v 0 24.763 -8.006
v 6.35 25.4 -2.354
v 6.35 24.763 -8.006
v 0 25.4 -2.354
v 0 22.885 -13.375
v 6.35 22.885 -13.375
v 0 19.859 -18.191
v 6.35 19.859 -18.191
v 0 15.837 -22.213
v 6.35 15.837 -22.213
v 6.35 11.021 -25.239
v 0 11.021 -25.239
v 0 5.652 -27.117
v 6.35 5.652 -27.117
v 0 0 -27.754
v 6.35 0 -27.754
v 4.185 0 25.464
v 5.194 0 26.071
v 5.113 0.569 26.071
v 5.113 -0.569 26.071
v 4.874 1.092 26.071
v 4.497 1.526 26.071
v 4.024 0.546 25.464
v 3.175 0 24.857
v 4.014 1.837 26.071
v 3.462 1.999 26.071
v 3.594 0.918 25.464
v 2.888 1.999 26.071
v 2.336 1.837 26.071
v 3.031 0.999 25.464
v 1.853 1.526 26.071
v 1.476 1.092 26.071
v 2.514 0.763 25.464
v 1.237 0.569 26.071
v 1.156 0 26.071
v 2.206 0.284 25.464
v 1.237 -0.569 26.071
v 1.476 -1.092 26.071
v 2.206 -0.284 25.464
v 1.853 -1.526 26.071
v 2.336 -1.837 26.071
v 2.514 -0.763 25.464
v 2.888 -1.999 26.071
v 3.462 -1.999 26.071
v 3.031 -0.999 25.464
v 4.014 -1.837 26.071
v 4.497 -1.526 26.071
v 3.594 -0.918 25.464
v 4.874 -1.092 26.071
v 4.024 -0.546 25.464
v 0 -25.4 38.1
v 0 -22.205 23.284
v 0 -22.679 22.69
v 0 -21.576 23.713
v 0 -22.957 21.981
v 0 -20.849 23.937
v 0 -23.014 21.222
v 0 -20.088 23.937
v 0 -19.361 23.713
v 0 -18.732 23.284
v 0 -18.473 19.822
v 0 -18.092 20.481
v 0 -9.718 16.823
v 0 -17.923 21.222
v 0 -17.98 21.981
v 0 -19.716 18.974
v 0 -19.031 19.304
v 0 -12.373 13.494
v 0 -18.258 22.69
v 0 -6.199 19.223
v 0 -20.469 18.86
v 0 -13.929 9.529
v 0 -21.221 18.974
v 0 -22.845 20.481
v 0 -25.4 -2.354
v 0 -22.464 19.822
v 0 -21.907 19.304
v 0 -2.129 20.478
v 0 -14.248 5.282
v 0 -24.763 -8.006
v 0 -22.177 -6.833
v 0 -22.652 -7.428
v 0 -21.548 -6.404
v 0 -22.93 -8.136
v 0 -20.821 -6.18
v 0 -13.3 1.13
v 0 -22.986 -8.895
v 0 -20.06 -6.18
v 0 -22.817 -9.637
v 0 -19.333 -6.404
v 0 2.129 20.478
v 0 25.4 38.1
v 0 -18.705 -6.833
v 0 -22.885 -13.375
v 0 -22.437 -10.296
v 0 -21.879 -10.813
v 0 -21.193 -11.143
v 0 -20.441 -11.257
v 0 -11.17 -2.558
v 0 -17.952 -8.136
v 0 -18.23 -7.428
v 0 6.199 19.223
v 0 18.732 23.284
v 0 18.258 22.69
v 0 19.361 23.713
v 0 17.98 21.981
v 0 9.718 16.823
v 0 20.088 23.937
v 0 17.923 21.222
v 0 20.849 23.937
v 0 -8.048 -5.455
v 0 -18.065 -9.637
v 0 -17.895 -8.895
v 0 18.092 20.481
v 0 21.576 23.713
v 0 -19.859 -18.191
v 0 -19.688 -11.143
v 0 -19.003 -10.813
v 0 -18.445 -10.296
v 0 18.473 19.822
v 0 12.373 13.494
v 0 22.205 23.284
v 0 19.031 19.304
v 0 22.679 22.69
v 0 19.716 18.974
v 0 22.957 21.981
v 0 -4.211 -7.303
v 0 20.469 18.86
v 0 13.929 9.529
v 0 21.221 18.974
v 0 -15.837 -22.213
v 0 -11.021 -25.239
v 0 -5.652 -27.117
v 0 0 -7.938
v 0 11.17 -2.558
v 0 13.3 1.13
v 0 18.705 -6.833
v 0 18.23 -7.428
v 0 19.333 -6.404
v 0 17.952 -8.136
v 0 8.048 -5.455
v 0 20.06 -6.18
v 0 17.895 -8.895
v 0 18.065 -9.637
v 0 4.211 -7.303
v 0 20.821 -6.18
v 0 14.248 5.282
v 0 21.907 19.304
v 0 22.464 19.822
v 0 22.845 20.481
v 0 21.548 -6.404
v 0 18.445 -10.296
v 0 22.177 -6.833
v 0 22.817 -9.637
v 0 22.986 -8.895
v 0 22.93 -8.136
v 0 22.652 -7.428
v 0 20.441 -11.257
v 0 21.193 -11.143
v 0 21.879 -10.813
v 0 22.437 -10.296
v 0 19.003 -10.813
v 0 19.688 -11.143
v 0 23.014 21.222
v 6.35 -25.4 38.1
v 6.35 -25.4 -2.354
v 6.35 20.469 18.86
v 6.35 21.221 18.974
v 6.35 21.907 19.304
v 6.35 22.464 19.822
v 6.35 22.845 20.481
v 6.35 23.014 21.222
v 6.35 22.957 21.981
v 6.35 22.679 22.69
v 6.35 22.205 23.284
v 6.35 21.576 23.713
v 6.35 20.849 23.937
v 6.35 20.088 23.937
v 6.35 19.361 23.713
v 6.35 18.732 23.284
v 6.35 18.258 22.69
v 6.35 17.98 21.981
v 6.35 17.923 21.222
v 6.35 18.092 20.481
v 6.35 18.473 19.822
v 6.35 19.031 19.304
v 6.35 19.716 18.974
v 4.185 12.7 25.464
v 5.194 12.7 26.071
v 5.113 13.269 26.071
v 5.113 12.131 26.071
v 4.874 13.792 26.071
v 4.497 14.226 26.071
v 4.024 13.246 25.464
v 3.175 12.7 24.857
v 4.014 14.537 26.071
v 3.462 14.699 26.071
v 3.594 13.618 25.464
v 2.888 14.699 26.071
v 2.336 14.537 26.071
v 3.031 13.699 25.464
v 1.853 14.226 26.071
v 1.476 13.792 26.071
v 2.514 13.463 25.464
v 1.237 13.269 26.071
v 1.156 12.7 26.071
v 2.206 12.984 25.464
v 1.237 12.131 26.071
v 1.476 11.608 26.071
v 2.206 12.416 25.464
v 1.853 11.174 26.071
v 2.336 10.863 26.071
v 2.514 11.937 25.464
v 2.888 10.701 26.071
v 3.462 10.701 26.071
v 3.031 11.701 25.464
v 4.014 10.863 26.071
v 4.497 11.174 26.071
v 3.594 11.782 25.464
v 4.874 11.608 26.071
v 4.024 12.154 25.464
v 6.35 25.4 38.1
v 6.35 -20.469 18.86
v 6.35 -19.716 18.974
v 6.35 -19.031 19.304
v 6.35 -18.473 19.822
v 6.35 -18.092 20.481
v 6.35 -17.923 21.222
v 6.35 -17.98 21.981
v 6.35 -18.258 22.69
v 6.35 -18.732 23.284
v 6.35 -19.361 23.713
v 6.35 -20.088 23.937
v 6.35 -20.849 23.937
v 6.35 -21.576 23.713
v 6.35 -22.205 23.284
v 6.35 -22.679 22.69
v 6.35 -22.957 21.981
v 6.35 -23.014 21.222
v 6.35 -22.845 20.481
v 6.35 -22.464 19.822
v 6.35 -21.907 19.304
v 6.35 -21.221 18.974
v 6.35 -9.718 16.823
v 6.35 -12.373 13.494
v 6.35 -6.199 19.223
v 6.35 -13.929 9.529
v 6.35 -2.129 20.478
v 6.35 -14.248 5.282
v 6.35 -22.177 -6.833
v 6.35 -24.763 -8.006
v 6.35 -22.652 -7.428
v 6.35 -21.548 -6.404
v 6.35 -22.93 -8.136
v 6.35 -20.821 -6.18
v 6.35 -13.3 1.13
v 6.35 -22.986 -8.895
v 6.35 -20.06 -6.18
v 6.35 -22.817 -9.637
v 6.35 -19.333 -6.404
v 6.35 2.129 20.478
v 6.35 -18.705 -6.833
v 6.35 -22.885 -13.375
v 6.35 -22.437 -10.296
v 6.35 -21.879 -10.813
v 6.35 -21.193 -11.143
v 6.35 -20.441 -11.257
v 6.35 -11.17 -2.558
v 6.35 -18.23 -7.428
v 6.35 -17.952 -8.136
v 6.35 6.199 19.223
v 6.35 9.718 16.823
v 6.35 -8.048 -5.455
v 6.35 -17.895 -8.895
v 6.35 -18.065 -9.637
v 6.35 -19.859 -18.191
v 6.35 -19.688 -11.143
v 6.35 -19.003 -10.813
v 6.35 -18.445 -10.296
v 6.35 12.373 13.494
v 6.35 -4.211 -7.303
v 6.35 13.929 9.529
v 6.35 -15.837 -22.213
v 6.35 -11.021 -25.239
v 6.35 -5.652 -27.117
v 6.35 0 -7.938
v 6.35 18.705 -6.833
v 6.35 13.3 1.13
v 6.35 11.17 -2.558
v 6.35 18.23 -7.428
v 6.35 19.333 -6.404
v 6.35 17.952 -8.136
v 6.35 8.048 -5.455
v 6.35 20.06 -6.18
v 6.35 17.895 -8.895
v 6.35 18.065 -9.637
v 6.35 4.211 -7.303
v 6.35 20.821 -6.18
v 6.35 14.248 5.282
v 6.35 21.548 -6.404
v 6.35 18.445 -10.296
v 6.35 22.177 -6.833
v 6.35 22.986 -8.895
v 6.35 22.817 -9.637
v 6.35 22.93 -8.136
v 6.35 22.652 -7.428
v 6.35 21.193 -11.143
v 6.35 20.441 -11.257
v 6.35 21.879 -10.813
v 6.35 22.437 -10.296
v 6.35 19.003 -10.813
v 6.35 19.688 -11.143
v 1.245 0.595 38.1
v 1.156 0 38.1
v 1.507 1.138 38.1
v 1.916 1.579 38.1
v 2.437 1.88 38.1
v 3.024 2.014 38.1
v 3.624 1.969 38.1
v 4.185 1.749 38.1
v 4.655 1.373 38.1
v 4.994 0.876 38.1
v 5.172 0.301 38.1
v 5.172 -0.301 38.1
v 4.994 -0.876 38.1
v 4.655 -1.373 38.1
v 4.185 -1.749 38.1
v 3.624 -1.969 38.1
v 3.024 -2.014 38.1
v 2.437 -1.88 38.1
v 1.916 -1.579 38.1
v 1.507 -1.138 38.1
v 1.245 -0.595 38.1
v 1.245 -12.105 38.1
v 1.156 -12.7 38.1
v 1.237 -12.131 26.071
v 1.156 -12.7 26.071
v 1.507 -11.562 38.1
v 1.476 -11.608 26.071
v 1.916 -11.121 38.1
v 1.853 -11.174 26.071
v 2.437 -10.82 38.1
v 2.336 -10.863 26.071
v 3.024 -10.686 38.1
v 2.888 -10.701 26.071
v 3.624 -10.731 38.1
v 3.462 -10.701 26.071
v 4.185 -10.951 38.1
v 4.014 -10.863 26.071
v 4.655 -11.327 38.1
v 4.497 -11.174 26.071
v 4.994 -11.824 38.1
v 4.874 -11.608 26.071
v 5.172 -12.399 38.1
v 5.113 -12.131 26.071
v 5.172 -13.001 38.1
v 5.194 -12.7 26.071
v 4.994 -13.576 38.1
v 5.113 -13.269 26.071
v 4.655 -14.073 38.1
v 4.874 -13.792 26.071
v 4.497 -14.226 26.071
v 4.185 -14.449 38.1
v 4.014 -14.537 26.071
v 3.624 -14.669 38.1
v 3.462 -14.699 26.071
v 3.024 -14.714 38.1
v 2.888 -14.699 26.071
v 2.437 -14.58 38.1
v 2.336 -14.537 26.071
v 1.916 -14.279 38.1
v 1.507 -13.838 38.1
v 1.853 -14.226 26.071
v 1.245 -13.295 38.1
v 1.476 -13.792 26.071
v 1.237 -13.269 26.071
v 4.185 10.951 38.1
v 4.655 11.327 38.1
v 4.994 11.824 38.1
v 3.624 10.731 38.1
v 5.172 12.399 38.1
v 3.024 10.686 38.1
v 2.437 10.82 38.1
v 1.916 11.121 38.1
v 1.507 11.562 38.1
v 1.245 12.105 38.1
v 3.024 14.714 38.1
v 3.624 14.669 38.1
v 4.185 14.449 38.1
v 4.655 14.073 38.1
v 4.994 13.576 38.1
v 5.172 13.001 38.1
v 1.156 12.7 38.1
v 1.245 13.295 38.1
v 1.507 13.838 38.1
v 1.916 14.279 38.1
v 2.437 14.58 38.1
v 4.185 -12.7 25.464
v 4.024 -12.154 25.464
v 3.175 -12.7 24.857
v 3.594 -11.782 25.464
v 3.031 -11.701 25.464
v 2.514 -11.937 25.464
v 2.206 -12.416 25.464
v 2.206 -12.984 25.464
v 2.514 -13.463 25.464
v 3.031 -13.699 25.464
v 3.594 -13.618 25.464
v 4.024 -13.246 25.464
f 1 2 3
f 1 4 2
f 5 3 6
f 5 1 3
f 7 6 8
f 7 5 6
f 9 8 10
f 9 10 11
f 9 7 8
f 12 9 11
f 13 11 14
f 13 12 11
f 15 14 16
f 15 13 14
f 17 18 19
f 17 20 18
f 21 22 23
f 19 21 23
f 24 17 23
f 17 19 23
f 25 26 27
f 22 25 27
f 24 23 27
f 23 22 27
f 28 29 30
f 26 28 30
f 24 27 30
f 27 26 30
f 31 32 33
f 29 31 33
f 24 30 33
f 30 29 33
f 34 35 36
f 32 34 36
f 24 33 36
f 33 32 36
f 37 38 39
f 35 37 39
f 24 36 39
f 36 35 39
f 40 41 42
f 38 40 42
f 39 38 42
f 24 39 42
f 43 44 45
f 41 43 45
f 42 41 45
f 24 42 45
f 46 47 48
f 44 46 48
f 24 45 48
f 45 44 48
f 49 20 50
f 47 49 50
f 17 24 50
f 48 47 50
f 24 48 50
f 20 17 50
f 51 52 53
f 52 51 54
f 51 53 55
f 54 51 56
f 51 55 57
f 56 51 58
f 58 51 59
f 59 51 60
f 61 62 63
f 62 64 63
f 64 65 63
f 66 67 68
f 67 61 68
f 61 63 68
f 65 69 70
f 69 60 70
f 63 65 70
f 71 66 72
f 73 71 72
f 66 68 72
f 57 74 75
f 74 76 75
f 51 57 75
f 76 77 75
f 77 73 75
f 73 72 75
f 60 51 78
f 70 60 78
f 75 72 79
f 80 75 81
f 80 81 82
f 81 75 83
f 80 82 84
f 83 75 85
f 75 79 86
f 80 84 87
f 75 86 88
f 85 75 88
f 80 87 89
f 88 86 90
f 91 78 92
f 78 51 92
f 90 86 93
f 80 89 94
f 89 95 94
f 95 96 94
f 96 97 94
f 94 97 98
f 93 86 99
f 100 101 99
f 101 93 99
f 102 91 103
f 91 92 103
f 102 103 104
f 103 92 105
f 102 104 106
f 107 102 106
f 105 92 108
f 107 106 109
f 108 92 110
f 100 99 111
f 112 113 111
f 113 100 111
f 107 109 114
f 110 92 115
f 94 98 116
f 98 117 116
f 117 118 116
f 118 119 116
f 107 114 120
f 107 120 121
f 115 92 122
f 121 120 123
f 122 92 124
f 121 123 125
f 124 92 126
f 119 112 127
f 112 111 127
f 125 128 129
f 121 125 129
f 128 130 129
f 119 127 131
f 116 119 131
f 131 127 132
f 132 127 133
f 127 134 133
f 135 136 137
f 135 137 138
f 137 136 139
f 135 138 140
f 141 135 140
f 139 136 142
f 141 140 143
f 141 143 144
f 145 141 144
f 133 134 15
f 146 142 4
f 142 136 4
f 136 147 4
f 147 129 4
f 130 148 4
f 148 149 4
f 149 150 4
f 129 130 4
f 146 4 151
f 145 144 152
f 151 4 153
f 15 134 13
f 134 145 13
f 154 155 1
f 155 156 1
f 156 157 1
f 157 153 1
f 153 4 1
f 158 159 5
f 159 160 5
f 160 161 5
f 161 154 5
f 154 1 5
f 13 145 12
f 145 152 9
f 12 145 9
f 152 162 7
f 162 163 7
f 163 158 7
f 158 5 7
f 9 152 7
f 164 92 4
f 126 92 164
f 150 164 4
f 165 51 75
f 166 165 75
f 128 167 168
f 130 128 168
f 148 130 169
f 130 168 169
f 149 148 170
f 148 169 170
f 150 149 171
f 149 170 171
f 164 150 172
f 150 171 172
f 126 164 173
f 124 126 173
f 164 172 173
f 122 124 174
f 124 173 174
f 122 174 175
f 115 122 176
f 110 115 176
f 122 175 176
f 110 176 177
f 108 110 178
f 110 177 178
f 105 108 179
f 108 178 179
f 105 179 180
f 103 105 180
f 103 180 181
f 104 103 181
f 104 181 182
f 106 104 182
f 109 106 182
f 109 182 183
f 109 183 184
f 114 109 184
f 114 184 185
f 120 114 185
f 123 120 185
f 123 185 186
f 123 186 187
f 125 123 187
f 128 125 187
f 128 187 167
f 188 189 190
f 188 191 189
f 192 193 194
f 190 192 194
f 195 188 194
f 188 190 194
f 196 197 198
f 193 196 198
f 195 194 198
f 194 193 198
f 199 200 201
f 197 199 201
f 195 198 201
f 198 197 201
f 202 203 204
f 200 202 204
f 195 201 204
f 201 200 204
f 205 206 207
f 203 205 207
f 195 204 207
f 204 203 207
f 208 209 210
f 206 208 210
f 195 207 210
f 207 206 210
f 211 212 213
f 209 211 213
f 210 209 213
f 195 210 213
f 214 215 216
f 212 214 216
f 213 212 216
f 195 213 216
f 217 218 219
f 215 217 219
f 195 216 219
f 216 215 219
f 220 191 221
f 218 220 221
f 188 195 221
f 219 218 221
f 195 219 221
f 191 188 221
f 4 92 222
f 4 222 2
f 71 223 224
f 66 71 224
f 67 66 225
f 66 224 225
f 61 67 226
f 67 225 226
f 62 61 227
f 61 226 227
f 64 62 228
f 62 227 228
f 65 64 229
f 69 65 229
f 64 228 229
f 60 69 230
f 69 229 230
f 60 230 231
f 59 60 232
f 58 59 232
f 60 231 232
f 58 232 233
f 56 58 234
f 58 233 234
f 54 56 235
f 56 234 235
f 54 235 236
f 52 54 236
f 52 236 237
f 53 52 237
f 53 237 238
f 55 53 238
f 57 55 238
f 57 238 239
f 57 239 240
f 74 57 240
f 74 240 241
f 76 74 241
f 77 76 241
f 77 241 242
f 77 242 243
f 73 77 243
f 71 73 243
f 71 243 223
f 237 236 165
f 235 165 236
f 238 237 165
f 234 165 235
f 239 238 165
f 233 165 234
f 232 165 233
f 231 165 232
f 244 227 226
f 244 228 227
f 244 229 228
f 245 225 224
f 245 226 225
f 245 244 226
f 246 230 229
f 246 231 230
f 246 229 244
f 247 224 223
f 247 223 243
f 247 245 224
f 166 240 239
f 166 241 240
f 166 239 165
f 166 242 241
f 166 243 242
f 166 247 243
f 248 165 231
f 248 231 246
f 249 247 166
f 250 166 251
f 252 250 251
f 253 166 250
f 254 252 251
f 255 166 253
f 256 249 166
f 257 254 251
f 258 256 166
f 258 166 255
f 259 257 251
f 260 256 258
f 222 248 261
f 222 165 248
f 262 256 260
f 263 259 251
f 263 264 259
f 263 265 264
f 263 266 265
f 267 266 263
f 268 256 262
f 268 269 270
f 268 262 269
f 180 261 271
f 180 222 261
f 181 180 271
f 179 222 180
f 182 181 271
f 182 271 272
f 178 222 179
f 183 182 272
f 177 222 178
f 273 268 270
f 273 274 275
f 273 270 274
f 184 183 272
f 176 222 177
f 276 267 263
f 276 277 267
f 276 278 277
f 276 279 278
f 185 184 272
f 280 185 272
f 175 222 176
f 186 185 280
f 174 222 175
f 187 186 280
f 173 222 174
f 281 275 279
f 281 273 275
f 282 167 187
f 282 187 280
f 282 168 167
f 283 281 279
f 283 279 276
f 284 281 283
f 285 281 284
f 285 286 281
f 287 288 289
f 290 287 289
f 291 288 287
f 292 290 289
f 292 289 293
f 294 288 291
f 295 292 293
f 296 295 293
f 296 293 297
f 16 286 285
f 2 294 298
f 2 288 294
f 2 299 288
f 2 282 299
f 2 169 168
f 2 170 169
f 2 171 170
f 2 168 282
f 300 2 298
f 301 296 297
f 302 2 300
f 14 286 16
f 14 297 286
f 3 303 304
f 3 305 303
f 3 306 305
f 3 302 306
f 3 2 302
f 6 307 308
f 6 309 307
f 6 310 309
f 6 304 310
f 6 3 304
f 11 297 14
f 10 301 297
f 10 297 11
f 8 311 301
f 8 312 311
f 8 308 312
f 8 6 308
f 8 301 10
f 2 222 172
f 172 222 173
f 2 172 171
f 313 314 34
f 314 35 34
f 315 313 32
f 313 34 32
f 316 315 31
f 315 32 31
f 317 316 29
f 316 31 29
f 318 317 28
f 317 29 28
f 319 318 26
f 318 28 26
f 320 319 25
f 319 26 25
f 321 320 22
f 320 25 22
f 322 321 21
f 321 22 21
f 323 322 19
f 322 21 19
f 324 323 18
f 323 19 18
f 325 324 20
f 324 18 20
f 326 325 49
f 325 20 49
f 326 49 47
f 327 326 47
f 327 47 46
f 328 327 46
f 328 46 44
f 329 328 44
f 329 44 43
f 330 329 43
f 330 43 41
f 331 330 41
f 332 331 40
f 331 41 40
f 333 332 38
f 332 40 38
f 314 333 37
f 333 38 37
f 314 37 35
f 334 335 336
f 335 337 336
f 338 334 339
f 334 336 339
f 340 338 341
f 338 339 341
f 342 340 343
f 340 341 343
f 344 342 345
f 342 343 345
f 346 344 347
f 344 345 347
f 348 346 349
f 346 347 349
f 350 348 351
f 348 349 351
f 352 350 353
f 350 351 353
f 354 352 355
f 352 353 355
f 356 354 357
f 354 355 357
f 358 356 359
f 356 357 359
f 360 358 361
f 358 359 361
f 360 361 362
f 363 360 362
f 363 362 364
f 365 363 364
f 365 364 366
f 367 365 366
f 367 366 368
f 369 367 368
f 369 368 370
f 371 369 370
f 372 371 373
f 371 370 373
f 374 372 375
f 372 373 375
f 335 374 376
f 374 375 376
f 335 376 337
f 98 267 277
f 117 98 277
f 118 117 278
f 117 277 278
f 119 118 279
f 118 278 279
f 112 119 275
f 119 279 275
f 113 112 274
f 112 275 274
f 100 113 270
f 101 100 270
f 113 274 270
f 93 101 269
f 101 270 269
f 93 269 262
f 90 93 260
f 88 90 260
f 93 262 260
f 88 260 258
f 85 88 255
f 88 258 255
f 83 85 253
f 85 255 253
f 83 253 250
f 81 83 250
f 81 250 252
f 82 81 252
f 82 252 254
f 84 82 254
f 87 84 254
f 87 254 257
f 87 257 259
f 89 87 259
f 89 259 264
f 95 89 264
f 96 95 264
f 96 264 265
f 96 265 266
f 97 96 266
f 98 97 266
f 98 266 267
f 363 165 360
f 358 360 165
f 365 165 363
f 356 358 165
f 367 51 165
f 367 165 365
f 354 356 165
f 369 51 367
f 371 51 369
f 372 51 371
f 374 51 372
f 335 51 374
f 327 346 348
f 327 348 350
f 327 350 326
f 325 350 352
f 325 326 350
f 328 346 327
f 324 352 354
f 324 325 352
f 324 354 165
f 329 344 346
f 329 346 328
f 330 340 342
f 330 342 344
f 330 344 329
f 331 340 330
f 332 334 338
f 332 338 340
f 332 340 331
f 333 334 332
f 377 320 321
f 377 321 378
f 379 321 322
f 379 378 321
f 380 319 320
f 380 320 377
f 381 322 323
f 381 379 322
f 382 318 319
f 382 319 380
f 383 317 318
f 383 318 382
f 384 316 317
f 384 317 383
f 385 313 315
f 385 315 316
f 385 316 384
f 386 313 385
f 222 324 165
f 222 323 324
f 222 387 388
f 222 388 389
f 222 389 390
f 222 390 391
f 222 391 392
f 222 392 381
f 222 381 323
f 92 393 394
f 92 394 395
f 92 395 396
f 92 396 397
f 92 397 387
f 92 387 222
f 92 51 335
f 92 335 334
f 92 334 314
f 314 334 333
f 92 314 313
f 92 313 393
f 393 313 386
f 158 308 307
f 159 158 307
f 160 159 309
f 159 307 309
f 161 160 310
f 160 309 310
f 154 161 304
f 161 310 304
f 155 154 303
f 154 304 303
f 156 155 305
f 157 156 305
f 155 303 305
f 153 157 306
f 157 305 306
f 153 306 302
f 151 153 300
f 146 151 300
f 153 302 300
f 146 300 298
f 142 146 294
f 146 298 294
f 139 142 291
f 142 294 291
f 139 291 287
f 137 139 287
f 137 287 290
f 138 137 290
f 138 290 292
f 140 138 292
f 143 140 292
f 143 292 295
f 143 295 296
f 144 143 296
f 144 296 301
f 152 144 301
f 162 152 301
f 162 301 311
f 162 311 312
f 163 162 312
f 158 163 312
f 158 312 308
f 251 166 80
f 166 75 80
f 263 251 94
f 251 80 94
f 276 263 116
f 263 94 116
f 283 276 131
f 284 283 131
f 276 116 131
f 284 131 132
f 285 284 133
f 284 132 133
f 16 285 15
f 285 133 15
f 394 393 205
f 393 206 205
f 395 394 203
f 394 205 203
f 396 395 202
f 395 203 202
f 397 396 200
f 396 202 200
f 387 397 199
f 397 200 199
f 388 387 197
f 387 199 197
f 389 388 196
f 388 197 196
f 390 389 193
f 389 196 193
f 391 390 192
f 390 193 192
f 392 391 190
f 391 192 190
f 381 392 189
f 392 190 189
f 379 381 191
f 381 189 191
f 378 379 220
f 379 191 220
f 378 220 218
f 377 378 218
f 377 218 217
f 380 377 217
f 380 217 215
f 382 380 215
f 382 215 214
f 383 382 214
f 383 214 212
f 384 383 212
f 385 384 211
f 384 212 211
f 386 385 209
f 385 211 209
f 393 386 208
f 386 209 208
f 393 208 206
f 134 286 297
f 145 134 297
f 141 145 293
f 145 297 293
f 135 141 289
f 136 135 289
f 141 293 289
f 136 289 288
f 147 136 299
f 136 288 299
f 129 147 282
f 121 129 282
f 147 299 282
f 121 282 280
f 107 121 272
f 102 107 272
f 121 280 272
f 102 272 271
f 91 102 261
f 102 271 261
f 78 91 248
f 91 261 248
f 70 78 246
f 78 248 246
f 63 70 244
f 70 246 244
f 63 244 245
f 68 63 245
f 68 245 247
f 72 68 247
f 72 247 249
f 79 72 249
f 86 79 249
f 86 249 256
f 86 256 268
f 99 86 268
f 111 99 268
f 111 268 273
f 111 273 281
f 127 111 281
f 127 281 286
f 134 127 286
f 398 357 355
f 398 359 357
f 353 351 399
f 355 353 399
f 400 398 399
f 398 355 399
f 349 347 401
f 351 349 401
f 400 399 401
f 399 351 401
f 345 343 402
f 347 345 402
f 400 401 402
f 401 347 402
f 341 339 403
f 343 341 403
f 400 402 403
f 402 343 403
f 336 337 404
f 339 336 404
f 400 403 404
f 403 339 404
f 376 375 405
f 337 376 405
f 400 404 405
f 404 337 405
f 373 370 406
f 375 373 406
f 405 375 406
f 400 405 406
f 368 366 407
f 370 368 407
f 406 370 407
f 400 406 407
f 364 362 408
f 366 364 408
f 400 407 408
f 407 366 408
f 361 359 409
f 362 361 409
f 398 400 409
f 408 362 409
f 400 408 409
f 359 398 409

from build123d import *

# Parameters (mm, degrees)
SKETCH2_W                  = 76.2
SKETCH2_H                  = 50.8
BOSS_EXTRUDE2_DEPTH        = 6.35
F_10_32_TAPPED_HOLE1_D     = 4.0386
F_10_32_TAPPED_HOLE1_DEPTH = 12.02944
F_10_32_TAPPED_HOLE1_TIP   = 1.213317848
SKETCH6_R                  = 14.2875
CUT_EXTRUDE1_DEPTH         = 47.228697797
F_10_CLEARANCE_HOLE1_D     = 5.1054
SKETCH13_W                 = 10.345899722
SKETCH13_H                 = 50.8
CUT_EXTRUDE2_DEPTH         = 47.228697797
FILLET3_R                  = 25.4


with BuildPart() as part:
    # Sketch2 → Boss-Extrude2 (new body)
    with BuildSketch(Plane(origin=(0, 0, 0), x_dir=(0, 0, -1), z_dir=(1, 0, 0))):
        Rectangle(SKETCH2_W, SKETCH2_H)
    extrude(amount=BOSS_EXTRUDE2_DEPTH)

    # #10-32 Tapped Hole1
    with Locations(Plane.XY.offset(38.1)):
        with Locations((3.175, -12.7), (3.175, 0), (3.175, 12.7)):
            Hole(F_10_32_TAPPED_HOLE1_D / 2, depth=F_10_32_TAPPED_HOLE1_DEPTH)
            with Locations((0, 0, -(F_10_32_TAPPED_HOLE1_DEPTH + F_10_32_TAPPED_HOLE1_TIP / 2))):  # 118° drill point
                Cone(0, F_10_32_TAPPED_HOLE1_D / 2, F_10_32_TAPPED_HOLE1_TIP, mode=Mode.SUBTRACT)

    # Sketch6 → Cut-Extrude1 (cut, through all)
    with BuildSketch(Plane(origin=(6.35, 0, 0), x_dir=(0, 0, -1), z_dir=(1, 0, 0))):
        with Locations((-6.35, 0)):
            Circle(SKETCH6_R)
    extrude(amount=-CUT_EXTRUDE1_DEPTH, mode=Mode.SUBTRACT)

    # #10 Clearance Hole1 (through all)
    with Locations(Plane.ZY):
        with Locations((-8.704100278, -20.440822776), (21.413163559, 20.468716687), (21.413163559, -20.468716687), (-8.704100278, 20.440822776)):
            Hole(F_10_CLEARANCE_HOLE1_D / 2)

    # Sketch13 → Cut-Extrude2 (cut, through all)
    with BuildSketch(Plane(origin=(6.35, 0, 0), x_dir=(0, 0, -1), z_dir=(1, 0, 0))):
        with Locations((32.927050139, 0)):
            Rectangle(SKETCH13_W, SKETCH13_H)
    extrude(amount=-CUT_EXTRUDE2_DEPTH, mode=Mode.SUBTRACT)

    # Fillet3
    fillet3_edges = [part.edges().sort_by_distance(p)[0] for p in [
        (3.175, 25.4, -27.754100278),
        (3.175, -25.4, -27.754100278),
    ]]
    fillet(fillet3_edges, radius=FILLET3_R - 0.0001)  # a hair under: the kernel refuses the full size


solid = part.part
